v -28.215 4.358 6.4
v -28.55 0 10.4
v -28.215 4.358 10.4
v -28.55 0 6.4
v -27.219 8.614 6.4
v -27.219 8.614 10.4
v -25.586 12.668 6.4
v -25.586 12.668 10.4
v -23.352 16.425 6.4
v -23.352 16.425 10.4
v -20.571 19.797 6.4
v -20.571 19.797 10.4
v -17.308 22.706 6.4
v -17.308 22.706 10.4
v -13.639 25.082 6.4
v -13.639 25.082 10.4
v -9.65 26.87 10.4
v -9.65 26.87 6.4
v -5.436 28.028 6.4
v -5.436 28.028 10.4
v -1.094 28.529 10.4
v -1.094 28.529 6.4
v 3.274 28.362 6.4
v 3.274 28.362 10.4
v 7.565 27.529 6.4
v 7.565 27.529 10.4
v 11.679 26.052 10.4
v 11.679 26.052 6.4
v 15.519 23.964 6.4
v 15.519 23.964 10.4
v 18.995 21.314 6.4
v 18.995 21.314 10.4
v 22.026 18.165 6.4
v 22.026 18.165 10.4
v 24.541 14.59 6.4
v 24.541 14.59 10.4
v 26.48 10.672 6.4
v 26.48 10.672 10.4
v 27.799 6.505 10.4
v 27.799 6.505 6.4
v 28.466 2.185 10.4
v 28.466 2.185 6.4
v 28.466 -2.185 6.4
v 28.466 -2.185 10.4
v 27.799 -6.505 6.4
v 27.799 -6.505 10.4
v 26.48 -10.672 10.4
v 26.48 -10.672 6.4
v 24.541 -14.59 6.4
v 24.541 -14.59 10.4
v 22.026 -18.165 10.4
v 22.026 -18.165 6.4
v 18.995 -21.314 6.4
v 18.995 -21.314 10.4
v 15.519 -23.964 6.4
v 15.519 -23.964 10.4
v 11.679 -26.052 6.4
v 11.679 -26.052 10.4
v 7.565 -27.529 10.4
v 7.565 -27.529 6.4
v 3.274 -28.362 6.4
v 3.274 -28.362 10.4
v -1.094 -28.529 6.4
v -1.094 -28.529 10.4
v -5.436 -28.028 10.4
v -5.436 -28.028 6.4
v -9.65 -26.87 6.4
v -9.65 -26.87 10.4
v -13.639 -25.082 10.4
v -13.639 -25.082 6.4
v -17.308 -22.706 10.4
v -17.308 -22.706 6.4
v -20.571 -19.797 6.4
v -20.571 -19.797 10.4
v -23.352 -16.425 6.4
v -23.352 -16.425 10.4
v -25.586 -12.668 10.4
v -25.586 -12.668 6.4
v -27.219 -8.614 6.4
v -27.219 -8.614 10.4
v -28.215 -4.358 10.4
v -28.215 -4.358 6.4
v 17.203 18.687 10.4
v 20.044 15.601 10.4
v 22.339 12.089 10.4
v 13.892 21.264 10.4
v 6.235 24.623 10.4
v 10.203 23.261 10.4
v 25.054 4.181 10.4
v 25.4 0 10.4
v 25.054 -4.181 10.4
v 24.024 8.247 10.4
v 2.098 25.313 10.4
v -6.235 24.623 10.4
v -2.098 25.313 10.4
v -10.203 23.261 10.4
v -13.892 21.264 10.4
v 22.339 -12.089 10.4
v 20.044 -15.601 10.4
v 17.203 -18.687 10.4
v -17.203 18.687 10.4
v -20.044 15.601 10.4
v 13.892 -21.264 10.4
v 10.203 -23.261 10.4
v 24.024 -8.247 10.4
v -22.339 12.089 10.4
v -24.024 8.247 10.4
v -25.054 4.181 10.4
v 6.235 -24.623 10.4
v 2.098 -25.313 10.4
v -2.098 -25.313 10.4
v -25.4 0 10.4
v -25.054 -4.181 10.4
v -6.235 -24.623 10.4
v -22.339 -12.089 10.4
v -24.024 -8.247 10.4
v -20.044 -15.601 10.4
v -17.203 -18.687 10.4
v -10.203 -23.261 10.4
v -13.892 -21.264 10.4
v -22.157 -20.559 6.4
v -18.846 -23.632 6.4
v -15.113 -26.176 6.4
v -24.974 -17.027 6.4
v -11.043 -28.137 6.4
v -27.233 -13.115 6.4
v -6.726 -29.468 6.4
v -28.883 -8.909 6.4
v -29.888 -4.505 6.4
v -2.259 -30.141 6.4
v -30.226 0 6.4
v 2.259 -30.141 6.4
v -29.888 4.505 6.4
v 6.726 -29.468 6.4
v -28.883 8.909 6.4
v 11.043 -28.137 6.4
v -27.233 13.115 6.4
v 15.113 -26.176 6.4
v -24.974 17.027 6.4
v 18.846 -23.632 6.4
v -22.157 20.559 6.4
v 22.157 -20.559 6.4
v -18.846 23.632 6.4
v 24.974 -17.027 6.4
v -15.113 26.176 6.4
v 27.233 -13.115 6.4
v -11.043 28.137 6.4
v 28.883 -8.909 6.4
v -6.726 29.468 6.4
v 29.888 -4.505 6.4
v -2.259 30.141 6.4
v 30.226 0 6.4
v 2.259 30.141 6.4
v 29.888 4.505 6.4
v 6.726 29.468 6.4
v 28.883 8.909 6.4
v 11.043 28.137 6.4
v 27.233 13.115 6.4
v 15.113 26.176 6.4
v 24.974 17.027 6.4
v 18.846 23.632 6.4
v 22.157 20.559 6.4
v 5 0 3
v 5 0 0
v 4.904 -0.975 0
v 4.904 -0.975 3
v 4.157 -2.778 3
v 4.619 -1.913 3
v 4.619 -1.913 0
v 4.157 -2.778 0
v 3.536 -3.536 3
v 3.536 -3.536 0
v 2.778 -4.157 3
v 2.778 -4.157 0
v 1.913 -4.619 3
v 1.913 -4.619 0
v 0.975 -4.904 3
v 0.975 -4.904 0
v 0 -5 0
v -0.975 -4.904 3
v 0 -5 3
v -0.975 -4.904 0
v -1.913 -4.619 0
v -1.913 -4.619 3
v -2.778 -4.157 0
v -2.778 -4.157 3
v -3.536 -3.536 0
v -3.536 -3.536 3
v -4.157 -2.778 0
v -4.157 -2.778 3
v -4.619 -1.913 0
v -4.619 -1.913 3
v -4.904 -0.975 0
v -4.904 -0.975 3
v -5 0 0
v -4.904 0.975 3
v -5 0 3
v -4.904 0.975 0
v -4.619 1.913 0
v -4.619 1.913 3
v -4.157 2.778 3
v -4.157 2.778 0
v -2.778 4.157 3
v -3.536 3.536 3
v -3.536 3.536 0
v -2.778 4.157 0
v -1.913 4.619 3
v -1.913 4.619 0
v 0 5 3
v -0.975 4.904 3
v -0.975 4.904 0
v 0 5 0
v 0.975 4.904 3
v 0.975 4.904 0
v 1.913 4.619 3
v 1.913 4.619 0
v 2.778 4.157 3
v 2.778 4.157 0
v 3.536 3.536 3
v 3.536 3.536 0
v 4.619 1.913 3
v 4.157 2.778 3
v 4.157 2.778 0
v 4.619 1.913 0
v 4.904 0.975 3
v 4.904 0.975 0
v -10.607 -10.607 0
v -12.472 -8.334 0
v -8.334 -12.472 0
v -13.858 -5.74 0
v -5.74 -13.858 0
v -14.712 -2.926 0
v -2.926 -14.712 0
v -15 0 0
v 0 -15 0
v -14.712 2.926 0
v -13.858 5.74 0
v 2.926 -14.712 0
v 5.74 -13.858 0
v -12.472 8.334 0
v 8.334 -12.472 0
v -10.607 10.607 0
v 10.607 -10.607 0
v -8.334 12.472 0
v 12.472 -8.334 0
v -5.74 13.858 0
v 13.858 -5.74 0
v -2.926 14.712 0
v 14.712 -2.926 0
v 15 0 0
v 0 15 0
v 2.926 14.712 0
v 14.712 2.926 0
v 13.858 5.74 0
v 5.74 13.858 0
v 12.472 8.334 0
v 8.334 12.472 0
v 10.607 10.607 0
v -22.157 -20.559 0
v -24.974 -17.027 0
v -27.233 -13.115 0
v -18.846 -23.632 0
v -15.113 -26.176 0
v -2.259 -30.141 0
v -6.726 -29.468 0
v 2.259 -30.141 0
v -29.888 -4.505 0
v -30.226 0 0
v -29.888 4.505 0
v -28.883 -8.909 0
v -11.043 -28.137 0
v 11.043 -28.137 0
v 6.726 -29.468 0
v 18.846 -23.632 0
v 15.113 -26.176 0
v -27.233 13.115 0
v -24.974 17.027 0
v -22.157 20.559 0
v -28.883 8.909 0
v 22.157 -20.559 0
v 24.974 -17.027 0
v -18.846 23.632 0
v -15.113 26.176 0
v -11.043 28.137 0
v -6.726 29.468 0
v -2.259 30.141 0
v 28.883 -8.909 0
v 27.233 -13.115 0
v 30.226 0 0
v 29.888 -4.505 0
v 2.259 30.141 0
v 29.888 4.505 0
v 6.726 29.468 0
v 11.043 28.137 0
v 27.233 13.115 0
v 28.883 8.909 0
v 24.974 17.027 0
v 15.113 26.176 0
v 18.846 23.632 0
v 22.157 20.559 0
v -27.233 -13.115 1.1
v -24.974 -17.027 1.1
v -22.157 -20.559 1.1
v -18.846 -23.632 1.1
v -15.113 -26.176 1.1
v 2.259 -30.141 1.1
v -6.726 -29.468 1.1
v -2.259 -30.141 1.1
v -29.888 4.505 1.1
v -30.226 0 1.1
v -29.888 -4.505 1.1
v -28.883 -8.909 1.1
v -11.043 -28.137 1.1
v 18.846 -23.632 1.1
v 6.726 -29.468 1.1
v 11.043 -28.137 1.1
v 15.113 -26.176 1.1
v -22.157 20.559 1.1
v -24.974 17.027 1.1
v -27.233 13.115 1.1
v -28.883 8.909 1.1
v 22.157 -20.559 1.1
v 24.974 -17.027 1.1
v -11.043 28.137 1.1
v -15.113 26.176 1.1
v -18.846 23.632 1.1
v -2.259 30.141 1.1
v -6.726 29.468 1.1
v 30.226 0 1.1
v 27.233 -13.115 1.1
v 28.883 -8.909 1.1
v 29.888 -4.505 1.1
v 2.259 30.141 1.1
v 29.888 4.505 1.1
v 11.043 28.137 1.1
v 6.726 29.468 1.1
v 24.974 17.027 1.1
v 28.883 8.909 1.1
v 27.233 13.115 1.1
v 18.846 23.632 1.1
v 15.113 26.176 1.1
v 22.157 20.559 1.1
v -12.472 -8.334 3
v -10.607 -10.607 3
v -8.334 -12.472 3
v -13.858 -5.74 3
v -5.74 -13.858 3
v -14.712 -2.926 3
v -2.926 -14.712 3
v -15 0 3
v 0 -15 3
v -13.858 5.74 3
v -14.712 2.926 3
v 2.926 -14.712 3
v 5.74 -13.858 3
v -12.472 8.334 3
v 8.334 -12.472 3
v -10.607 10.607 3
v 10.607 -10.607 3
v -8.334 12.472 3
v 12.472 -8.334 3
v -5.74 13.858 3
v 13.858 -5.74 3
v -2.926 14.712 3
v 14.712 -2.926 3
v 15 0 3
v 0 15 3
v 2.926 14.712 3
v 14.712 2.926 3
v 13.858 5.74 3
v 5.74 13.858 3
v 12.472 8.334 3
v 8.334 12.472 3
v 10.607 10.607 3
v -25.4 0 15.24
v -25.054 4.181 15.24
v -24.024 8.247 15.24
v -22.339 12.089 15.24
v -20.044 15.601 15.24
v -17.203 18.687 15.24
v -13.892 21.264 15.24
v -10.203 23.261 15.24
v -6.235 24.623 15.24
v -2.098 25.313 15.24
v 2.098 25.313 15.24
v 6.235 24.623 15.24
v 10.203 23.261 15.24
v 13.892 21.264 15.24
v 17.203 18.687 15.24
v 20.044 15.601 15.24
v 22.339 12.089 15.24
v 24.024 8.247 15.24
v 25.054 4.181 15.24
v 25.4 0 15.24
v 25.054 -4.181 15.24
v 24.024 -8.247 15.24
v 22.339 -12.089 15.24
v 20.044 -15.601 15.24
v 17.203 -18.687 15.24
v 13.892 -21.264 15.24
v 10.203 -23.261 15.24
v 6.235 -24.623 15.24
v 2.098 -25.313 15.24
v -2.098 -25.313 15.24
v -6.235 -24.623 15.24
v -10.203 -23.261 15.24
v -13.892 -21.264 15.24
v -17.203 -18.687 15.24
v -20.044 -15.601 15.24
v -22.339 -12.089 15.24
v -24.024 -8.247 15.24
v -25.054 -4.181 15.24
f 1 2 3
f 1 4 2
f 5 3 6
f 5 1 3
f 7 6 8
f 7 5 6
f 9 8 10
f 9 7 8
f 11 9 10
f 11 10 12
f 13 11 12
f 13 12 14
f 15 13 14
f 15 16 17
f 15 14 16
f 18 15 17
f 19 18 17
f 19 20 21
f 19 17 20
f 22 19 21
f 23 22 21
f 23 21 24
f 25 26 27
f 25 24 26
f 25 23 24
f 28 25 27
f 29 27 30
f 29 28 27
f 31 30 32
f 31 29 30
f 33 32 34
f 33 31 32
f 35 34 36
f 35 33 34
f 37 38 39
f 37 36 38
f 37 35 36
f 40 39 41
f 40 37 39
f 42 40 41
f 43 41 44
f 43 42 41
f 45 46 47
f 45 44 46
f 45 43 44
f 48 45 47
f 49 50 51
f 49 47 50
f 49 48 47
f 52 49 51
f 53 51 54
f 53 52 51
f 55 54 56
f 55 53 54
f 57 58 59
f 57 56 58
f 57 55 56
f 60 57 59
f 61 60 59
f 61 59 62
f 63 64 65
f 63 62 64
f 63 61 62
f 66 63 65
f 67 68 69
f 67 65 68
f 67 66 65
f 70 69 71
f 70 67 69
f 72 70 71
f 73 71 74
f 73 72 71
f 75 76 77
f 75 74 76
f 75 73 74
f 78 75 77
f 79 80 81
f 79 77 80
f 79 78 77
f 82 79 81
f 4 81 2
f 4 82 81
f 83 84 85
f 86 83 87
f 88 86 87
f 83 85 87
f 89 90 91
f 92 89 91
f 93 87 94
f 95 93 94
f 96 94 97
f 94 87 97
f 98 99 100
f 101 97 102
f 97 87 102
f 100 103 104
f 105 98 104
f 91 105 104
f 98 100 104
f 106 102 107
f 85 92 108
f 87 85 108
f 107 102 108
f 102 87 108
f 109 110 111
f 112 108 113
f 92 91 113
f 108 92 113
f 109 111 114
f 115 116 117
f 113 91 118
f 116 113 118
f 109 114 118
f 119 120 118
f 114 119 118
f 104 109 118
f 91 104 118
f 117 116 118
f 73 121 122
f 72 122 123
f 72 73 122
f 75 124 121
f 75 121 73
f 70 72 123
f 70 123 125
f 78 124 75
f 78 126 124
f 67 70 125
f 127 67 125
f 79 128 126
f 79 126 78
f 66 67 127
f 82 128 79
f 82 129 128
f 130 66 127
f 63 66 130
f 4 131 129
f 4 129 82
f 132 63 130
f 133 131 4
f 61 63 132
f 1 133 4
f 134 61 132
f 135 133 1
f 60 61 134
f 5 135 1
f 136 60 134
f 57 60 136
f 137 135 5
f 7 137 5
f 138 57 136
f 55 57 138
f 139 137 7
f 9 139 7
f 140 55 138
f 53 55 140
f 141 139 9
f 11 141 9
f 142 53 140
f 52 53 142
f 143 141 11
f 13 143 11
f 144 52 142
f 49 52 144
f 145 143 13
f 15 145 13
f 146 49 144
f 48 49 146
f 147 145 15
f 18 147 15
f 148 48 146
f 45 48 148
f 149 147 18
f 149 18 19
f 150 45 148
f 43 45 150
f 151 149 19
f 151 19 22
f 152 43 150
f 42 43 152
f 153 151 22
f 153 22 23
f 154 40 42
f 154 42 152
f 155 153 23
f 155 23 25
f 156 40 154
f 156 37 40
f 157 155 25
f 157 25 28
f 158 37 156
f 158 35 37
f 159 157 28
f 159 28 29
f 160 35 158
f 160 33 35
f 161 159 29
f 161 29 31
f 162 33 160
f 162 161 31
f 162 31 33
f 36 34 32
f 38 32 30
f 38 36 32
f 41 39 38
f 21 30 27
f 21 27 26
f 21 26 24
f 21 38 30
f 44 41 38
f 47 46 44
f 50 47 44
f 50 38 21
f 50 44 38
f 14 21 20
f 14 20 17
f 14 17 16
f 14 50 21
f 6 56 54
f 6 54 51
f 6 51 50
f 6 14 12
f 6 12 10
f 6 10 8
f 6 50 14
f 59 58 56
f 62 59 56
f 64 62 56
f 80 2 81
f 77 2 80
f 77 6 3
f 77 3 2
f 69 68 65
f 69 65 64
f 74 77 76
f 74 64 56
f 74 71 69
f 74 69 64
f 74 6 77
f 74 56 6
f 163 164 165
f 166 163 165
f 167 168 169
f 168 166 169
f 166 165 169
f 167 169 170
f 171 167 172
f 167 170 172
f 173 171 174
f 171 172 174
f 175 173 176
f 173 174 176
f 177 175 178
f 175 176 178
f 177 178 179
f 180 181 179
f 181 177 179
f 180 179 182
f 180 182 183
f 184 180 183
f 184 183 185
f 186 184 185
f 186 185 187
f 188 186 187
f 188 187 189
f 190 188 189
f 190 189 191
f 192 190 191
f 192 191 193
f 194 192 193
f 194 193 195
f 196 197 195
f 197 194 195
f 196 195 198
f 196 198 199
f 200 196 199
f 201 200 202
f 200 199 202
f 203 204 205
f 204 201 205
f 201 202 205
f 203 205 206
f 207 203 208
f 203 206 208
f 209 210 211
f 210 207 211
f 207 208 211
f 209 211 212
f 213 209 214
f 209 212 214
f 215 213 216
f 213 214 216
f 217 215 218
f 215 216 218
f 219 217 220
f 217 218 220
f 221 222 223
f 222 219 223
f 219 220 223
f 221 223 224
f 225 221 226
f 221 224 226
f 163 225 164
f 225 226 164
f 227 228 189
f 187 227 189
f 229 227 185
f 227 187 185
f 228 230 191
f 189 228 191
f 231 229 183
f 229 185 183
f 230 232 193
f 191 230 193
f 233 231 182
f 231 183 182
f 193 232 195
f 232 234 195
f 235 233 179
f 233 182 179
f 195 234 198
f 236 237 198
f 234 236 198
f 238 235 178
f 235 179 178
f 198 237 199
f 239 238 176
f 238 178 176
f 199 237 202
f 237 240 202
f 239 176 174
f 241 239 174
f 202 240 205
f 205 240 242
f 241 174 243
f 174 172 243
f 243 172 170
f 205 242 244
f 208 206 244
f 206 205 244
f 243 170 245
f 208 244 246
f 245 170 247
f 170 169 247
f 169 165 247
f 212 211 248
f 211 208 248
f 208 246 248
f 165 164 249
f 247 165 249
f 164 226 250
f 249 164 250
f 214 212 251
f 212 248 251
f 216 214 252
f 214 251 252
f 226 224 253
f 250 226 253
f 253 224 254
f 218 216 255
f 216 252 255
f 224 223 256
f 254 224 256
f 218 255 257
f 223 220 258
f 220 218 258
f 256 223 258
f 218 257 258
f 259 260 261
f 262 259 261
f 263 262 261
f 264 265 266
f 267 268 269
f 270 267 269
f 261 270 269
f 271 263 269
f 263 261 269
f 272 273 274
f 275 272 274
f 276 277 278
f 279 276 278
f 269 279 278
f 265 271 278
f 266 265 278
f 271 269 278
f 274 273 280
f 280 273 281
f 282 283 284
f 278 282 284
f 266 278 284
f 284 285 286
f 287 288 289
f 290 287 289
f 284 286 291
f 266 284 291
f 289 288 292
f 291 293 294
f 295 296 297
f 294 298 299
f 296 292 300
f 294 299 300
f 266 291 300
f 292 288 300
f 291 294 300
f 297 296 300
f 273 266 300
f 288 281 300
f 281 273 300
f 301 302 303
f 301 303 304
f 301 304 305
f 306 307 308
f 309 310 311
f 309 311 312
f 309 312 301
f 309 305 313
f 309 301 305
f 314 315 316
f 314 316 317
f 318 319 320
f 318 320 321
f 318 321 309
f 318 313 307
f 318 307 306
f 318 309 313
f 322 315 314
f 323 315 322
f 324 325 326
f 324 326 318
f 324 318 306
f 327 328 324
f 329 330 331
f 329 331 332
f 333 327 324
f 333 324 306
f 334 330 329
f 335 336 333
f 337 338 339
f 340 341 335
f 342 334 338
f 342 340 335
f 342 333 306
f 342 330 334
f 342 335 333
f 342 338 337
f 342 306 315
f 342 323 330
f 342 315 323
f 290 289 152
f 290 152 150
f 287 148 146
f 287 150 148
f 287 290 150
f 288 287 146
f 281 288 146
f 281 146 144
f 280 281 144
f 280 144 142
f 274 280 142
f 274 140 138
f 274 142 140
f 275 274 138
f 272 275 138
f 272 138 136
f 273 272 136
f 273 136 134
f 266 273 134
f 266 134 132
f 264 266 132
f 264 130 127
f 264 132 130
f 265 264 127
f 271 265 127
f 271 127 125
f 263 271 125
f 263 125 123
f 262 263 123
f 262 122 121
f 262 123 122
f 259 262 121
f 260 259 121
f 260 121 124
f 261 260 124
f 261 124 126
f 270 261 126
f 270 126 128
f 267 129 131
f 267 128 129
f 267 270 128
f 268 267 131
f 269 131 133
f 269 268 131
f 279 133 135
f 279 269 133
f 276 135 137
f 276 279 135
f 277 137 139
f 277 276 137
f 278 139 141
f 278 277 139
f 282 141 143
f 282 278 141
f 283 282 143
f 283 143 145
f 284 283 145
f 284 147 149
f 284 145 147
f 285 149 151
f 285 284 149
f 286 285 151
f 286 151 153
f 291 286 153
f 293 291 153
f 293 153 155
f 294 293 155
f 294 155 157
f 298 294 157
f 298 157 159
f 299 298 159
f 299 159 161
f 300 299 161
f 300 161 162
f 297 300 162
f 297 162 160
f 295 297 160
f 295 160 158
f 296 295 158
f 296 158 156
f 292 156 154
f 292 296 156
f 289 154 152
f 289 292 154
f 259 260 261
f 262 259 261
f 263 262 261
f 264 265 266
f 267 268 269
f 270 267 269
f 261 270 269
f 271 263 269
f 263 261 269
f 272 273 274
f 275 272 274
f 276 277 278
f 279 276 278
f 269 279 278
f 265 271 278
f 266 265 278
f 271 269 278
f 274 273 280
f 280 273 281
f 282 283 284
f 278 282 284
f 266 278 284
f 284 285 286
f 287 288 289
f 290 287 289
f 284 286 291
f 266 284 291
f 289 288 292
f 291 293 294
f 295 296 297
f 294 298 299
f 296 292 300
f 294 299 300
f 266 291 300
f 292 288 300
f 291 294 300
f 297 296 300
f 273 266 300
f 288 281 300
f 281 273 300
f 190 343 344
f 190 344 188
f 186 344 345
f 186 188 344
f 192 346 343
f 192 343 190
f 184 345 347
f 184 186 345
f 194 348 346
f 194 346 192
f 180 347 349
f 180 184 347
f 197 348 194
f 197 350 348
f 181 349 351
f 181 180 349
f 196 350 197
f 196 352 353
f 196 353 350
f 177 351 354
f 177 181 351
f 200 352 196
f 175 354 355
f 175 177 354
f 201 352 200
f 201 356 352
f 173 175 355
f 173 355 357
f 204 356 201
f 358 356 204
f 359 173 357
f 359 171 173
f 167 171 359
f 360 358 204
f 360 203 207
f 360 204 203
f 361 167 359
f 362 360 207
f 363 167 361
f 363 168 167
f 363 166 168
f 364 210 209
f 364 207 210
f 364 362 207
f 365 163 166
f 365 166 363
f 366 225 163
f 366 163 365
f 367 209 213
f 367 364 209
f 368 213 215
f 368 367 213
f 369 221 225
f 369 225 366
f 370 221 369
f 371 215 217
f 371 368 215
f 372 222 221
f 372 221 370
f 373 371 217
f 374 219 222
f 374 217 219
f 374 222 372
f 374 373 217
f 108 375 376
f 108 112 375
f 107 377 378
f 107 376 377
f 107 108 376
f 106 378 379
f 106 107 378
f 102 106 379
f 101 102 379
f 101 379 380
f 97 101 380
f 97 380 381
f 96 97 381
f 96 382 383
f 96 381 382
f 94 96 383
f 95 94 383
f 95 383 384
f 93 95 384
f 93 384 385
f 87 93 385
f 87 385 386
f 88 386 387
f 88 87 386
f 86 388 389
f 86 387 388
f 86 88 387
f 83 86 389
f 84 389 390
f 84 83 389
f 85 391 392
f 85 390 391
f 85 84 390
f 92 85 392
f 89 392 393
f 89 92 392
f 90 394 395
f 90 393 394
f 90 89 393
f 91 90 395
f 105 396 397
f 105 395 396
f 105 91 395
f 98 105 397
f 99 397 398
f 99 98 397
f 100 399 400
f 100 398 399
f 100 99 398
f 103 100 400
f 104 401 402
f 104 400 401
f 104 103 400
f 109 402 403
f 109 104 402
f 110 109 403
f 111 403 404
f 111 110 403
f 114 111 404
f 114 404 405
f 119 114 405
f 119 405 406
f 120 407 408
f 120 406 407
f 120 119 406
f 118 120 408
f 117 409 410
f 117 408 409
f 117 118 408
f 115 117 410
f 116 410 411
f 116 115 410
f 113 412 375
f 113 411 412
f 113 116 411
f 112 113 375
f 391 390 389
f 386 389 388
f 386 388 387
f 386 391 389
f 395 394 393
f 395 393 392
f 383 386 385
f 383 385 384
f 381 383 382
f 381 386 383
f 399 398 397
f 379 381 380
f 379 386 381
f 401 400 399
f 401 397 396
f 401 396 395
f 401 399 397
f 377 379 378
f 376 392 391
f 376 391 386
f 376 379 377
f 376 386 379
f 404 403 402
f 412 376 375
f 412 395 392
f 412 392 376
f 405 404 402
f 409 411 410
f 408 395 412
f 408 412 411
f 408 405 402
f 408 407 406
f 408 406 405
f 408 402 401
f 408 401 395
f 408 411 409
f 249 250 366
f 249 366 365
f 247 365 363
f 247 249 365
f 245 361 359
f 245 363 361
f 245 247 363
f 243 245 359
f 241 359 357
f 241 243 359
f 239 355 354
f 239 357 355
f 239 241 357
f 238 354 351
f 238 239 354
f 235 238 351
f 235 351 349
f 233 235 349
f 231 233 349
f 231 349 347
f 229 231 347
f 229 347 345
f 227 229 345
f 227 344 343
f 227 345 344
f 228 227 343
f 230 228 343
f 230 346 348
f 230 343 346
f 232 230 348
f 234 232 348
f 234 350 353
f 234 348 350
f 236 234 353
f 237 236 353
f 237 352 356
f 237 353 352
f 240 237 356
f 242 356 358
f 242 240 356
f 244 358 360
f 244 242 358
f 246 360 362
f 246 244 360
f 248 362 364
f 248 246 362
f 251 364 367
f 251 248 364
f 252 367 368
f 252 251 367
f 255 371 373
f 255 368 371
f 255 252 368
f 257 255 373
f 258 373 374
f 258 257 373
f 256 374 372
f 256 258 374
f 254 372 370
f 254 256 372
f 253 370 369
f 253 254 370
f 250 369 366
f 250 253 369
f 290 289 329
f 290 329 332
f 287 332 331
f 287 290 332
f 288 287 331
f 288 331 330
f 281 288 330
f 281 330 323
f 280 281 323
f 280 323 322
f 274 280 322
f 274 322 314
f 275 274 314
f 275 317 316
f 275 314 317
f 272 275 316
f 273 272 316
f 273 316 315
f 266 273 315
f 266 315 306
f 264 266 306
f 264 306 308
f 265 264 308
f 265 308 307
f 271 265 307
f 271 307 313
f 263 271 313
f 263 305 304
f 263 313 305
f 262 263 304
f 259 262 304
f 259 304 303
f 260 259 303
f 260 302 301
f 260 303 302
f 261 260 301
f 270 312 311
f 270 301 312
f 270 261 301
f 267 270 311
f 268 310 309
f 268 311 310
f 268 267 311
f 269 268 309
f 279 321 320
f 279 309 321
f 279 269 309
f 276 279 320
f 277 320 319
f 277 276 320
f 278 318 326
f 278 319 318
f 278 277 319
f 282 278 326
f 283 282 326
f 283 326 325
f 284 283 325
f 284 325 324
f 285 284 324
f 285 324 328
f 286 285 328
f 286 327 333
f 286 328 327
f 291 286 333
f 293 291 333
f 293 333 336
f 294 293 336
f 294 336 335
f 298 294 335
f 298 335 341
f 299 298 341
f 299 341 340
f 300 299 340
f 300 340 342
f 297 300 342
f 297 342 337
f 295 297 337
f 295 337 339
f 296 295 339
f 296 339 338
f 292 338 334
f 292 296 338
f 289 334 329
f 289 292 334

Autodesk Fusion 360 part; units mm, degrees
sketch "Sketch1" plane through (0, 0, 0) normal (0, 0, 1) x (1, 0, 0)
  circle A0 centre (0, 0) radius 7
  dimension "d1" = 14
extrude "Extrude1" add sketch "Sketch1" along normal blind 1.1

Autodesk Fusion 360 part; units mm, degrees
sketch "Sketch1" plane through (0, 0, 0) normal (0, 0, 1) x (1, 0, 0)
  line L0 (7.5, 7.5) -> (-7.5, 7.5)
  line L1 (-7.5, 7.5) -> (-7.5, -7.5)
  line L2 (-7.5, -7.5) -> (7.5, -7.5)
  line L3 (7.5, -7.5) -> (7.5, 7.5)
  line L4 (7.5, 7.5) -> (-7.5, -7.5) construction
  line L5 (-7.5, 7.5) -> (7.5, -7.5) construction
  dimension "d2" = 15
extrude "Extrude1" add sketch "Sketch1" along normal blind 0.2

Autodesk Fusion 360 part; units mm, degrees
sketch "Sketch1" plane through (0, 0, 0) normal (0, 0, 1) x (1, 0, 0)
  circle A0 centre (0, 0) radius 1.5 construction
  circle A1 centre (0, 0) radius 3.2 construction
  circle A2 centre (0, 0) radius 6.2 construction
  circle A3 centre (0, 0) radius 18 construction
  dimension "d1" = 3
  dimension "d2" = 6.4
  dimension "d3" = 12.4
  dimension "d4" = 36
sketch "Sketch1 (2)" plane through (0, 0, 0) normal (0, 0, 1) x (1, 0, 0) in component "Inner Disc"
  circle A0 centre (0, 0) radius 3
  dimension "d5" = 6
extrude "Extrude1" add sketch "Sketch1 (2)" along normal blind 3 makes body 1 in component "Inner Disc"
sketch "Sketch1 (3)" plane through (0, 0, 0) normal (0, 0, 1) x (1, 0, 0) in component "Spacer Ring"
  circle A0 centre (0, 0) radius 3
  circle A1 centre (0, 0) radius 5
  dimension "d8" = 6
  dimension "d9" = 10
extrude "Extrude1'" add sketch "Sketch1 (3)" along normal blind 3.15 separate body makes body 2 in component "Spacer Ring"
sketch "Sketch1 (4)" plane through (0, 0, 0) normal (0, 0, 1) x (1, 0, 0) in component "Outer Ring"
  circle A0 centre (0, 0) radius 5
  circle A1 centre (0, 0) radius 15
  dimension "d12" = 10
  dimension "d13" = 30
extrude "Extrude1''" add sketch "Sketch1 (4)" along normal blind 3 separate body makes body 3 in component "Outer Ring"
fillet "Fillet1" radius 0.15 1 edges at (-4.6616, -1.8081, 3.15) on bodies 2 in component "Spacer Ring"
fillet "Fillet2" radius 0.15 1 edges at (-2.797, 1.0848, 3.15) on bodies 2 in component "Spacer Ring"
component "Outer Ring" placed x (1, 0, 0) y (0, 1, 0) z (0, 0, 1) at (0, 0, 0)
component "Spacer Ring" placed x (1, 0, 0) y (0, 1, 0) z (0, 0, 1) at (0, 0, 0)
component "Inner Disc" placed x (1, 0, 0) y (0, 1, 0) z (0, 0, 1) at (0, 0, 0)

Autodesk Fusion 360 part; units mm, degrees
sketch "Sketch1" plane through (0, 0, 0) normal (0, 0, 1) x (1, 0, 0)
  circle A0 centre (0, 0) radius 30.226
  dimension "d1" = 60.452
extrude "Extrude1" add sketch "Sketch1" along normal blind 6.4 makes body 1
sketch "Sketch2" plane through (0, 0, 6.4) normal (0, 0, 1) x (-1, 0, 0)
  circle A0 centre (0, 0) radius 30.226
  circle A1 centre (0, 0) radius 28.55
  dimension "d4" = 57.1
extrude "Extrude2" add sketch "Sketch2" along normal blind 4 contours A1 bodies 1
sketch "Sketch3" plane through (0, 0, 10.4) normal (0, 0, 1) x (-1, 0, 0)
  circle A0 centre (0, 0) radius 28.55
  circle A1 centre (0, 0) radius 25.4
  dimension "d7" = 50.8
extrude "Extrude3" add sketch "Sketch3" along normal blind 4.84 separate body contours A1 makes body 2
equation "d5 = 10.40 mm - 6.40 mm"
equation "d8 = 0.60 in - 10.40 mm"
